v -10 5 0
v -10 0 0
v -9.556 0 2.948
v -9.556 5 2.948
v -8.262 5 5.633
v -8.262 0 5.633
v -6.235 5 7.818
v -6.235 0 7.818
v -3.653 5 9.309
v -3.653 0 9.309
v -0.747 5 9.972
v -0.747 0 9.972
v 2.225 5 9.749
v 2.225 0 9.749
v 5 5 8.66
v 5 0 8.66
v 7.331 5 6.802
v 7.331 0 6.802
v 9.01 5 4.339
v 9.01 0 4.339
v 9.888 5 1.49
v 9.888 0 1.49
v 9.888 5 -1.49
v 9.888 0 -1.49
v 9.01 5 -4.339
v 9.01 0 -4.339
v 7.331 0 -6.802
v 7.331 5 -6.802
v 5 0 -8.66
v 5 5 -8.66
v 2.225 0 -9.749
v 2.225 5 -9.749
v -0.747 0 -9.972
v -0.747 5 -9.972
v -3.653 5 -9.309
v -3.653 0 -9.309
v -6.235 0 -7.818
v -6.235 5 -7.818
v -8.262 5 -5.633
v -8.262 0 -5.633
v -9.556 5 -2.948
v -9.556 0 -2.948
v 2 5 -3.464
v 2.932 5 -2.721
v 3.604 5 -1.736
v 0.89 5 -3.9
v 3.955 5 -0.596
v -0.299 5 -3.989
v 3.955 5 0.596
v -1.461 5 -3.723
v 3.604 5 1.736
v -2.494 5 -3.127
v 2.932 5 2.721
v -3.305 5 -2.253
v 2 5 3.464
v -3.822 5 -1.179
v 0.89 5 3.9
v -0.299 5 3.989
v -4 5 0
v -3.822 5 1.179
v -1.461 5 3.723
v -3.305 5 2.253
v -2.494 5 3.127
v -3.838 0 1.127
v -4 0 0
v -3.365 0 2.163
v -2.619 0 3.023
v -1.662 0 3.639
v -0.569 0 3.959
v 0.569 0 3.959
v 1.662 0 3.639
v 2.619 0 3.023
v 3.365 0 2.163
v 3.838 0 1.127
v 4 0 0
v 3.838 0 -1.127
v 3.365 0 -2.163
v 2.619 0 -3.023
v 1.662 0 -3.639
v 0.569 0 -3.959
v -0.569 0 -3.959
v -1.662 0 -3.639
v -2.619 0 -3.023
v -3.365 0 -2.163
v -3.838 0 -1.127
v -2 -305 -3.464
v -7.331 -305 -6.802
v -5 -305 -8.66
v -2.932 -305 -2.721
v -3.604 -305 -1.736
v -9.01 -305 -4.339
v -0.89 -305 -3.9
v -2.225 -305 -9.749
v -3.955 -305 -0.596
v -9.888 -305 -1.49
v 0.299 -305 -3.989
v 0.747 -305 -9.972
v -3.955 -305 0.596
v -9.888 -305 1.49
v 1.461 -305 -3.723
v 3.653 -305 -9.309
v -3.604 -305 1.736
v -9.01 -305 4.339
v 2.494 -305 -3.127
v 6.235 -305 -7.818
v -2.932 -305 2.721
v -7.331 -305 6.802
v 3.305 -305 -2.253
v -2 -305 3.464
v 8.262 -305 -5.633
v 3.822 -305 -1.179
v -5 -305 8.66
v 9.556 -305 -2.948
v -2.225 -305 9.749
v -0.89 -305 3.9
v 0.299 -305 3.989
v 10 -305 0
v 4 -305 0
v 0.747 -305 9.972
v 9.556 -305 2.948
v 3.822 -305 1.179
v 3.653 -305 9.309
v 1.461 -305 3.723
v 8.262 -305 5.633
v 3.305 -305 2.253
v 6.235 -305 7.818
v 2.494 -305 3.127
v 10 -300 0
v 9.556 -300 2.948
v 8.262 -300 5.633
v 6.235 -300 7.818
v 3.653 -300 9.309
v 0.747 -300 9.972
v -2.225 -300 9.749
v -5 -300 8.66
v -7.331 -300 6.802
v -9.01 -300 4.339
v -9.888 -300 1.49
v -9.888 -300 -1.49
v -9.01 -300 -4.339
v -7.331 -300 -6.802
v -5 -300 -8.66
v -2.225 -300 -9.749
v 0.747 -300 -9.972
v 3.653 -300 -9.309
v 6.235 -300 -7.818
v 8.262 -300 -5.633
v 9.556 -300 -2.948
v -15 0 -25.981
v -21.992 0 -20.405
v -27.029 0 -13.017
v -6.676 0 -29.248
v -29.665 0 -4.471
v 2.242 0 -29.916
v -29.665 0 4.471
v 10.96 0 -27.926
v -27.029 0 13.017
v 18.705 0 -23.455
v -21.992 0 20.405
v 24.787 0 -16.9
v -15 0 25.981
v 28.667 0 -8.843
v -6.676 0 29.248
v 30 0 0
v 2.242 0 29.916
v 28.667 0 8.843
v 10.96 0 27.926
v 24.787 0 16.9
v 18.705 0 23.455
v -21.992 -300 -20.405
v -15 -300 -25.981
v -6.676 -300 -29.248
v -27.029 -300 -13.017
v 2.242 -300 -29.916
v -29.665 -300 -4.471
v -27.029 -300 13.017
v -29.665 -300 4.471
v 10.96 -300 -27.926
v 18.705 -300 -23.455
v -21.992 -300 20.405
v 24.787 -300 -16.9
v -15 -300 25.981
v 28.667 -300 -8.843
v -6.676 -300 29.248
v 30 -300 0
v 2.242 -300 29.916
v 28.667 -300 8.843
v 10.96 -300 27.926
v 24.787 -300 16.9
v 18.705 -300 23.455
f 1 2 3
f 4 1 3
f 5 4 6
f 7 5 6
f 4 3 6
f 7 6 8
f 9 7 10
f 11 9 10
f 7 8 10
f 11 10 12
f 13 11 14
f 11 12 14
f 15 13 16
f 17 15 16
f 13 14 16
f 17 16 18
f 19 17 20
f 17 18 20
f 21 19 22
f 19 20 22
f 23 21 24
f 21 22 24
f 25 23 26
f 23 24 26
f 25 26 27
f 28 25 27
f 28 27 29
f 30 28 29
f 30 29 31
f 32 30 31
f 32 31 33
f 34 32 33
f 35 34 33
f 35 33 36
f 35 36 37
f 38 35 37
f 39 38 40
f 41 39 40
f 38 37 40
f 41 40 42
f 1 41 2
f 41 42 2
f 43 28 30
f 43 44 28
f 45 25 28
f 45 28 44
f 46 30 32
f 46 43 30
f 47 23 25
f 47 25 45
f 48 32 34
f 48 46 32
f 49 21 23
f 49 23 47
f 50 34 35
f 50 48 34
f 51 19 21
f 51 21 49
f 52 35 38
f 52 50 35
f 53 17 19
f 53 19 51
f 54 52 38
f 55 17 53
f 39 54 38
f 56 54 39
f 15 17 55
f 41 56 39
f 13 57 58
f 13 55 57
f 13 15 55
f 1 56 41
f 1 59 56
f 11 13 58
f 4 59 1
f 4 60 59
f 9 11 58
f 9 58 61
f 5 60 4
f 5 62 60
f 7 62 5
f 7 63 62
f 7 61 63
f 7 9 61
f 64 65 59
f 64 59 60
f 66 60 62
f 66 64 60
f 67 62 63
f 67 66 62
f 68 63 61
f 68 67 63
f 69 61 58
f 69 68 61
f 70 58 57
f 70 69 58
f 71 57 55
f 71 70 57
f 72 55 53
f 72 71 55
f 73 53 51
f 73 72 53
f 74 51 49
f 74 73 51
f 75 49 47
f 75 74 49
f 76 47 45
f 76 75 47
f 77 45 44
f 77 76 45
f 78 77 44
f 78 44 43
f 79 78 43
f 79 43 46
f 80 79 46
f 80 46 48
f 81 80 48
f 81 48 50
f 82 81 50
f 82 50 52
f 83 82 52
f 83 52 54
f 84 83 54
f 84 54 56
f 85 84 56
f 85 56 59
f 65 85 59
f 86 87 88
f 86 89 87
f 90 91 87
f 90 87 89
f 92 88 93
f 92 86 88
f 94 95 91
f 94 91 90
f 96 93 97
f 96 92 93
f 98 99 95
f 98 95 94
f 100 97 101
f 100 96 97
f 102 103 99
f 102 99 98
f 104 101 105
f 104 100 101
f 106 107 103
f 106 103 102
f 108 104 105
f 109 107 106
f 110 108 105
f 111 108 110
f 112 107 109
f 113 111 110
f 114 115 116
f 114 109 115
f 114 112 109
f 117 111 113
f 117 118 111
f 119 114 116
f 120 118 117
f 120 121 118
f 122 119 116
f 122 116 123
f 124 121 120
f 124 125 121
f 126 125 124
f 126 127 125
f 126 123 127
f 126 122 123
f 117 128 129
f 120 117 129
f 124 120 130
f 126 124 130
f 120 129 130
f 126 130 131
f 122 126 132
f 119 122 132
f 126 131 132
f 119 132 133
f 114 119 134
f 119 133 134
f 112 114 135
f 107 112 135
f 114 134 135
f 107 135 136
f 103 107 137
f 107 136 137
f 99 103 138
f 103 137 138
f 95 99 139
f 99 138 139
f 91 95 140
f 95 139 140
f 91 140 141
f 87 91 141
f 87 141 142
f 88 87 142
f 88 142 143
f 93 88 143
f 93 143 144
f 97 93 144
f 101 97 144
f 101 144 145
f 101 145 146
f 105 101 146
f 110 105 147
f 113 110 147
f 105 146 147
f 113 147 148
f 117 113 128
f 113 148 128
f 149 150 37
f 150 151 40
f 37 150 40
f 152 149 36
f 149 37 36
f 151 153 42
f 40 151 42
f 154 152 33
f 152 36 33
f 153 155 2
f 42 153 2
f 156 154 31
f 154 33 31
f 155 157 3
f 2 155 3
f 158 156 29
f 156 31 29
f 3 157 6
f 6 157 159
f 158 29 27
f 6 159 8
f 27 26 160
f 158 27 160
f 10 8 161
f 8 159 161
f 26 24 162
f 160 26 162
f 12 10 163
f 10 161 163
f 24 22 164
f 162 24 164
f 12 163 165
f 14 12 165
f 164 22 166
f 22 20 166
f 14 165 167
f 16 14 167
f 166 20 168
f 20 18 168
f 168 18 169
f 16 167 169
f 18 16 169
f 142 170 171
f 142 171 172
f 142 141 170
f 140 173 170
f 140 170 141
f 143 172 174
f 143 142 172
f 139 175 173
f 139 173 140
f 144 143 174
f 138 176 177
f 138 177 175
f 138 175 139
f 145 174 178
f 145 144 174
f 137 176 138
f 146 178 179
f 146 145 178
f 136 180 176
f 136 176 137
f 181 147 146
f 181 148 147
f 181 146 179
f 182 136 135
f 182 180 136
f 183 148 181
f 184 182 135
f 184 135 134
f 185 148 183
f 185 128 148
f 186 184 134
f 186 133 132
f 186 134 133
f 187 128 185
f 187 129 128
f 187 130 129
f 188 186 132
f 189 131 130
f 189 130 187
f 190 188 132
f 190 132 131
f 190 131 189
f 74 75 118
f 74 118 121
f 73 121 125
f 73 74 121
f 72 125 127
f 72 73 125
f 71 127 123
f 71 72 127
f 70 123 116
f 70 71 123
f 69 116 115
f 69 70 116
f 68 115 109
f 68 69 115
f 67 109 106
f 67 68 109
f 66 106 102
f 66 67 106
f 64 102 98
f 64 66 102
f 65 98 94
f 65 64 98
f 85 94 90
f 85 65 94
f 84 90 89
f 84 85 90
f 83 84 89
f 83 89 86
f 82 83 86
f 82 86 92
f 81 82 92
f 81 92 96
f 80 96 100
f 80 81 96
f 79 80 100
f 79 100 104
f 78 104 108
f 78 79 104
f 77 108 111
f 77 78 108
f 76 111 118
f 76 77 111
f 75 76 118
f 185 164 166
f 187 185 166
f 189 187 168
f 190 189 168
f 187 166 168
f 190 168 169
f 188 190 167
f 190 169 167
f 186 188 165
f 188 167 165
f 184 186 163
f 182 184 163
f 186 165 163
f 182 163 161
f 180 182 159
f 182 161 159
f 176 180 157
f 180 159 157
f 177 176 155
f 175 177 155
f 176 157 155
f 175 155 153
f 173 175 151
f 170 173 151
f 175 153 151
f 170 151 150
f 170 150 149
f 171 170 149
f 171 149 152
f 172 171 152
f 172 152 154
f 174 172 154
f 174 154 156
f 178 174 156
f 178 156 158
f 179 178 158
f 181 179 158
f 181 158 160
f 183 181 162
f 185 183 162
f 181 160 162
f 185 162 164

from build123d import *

# Parameters (mm, degrees)
F0_R     = 30
F0_R_2   = 4
F1_DEPTH = 300
F2_R     = 10
F2_R_2   = 4
F3_DEPTH = 5
F4_R     = 10
F4_R_2   = 4
F5_DEPTH = 5


with BuildPart() as f1:
    # F0 (on Front) → F1 (new body)
    with BuildSketch(Plane.XZ):
        Circle(F0_R)
        Circle(F0_R_2, mode=Mode.SUBTRACT)
    extrude(amount=F1_DEPTH)

    # F2 (on face) → F3 (join)
    with BuildSketch(Plane.XZ.offset(300)):
        Circle(F2_R)
        Circle(F2_R_2, mode=Mode.SUBTRACT)
    extrude(amount=F3_DEPTH)

    # F4 (on face) → F5 (join)
    with BuildSketch(Plane(origin=(0, 0, 0), x_dir=(-1, 0, 0), z_dir=(0, 1, 0))):
        Circle(F4_R)
        Circle(F4_R_2, mode=Mode.SUBTRACT)
    extrude(amount=F5_DEPTH)


solid = f1.part
